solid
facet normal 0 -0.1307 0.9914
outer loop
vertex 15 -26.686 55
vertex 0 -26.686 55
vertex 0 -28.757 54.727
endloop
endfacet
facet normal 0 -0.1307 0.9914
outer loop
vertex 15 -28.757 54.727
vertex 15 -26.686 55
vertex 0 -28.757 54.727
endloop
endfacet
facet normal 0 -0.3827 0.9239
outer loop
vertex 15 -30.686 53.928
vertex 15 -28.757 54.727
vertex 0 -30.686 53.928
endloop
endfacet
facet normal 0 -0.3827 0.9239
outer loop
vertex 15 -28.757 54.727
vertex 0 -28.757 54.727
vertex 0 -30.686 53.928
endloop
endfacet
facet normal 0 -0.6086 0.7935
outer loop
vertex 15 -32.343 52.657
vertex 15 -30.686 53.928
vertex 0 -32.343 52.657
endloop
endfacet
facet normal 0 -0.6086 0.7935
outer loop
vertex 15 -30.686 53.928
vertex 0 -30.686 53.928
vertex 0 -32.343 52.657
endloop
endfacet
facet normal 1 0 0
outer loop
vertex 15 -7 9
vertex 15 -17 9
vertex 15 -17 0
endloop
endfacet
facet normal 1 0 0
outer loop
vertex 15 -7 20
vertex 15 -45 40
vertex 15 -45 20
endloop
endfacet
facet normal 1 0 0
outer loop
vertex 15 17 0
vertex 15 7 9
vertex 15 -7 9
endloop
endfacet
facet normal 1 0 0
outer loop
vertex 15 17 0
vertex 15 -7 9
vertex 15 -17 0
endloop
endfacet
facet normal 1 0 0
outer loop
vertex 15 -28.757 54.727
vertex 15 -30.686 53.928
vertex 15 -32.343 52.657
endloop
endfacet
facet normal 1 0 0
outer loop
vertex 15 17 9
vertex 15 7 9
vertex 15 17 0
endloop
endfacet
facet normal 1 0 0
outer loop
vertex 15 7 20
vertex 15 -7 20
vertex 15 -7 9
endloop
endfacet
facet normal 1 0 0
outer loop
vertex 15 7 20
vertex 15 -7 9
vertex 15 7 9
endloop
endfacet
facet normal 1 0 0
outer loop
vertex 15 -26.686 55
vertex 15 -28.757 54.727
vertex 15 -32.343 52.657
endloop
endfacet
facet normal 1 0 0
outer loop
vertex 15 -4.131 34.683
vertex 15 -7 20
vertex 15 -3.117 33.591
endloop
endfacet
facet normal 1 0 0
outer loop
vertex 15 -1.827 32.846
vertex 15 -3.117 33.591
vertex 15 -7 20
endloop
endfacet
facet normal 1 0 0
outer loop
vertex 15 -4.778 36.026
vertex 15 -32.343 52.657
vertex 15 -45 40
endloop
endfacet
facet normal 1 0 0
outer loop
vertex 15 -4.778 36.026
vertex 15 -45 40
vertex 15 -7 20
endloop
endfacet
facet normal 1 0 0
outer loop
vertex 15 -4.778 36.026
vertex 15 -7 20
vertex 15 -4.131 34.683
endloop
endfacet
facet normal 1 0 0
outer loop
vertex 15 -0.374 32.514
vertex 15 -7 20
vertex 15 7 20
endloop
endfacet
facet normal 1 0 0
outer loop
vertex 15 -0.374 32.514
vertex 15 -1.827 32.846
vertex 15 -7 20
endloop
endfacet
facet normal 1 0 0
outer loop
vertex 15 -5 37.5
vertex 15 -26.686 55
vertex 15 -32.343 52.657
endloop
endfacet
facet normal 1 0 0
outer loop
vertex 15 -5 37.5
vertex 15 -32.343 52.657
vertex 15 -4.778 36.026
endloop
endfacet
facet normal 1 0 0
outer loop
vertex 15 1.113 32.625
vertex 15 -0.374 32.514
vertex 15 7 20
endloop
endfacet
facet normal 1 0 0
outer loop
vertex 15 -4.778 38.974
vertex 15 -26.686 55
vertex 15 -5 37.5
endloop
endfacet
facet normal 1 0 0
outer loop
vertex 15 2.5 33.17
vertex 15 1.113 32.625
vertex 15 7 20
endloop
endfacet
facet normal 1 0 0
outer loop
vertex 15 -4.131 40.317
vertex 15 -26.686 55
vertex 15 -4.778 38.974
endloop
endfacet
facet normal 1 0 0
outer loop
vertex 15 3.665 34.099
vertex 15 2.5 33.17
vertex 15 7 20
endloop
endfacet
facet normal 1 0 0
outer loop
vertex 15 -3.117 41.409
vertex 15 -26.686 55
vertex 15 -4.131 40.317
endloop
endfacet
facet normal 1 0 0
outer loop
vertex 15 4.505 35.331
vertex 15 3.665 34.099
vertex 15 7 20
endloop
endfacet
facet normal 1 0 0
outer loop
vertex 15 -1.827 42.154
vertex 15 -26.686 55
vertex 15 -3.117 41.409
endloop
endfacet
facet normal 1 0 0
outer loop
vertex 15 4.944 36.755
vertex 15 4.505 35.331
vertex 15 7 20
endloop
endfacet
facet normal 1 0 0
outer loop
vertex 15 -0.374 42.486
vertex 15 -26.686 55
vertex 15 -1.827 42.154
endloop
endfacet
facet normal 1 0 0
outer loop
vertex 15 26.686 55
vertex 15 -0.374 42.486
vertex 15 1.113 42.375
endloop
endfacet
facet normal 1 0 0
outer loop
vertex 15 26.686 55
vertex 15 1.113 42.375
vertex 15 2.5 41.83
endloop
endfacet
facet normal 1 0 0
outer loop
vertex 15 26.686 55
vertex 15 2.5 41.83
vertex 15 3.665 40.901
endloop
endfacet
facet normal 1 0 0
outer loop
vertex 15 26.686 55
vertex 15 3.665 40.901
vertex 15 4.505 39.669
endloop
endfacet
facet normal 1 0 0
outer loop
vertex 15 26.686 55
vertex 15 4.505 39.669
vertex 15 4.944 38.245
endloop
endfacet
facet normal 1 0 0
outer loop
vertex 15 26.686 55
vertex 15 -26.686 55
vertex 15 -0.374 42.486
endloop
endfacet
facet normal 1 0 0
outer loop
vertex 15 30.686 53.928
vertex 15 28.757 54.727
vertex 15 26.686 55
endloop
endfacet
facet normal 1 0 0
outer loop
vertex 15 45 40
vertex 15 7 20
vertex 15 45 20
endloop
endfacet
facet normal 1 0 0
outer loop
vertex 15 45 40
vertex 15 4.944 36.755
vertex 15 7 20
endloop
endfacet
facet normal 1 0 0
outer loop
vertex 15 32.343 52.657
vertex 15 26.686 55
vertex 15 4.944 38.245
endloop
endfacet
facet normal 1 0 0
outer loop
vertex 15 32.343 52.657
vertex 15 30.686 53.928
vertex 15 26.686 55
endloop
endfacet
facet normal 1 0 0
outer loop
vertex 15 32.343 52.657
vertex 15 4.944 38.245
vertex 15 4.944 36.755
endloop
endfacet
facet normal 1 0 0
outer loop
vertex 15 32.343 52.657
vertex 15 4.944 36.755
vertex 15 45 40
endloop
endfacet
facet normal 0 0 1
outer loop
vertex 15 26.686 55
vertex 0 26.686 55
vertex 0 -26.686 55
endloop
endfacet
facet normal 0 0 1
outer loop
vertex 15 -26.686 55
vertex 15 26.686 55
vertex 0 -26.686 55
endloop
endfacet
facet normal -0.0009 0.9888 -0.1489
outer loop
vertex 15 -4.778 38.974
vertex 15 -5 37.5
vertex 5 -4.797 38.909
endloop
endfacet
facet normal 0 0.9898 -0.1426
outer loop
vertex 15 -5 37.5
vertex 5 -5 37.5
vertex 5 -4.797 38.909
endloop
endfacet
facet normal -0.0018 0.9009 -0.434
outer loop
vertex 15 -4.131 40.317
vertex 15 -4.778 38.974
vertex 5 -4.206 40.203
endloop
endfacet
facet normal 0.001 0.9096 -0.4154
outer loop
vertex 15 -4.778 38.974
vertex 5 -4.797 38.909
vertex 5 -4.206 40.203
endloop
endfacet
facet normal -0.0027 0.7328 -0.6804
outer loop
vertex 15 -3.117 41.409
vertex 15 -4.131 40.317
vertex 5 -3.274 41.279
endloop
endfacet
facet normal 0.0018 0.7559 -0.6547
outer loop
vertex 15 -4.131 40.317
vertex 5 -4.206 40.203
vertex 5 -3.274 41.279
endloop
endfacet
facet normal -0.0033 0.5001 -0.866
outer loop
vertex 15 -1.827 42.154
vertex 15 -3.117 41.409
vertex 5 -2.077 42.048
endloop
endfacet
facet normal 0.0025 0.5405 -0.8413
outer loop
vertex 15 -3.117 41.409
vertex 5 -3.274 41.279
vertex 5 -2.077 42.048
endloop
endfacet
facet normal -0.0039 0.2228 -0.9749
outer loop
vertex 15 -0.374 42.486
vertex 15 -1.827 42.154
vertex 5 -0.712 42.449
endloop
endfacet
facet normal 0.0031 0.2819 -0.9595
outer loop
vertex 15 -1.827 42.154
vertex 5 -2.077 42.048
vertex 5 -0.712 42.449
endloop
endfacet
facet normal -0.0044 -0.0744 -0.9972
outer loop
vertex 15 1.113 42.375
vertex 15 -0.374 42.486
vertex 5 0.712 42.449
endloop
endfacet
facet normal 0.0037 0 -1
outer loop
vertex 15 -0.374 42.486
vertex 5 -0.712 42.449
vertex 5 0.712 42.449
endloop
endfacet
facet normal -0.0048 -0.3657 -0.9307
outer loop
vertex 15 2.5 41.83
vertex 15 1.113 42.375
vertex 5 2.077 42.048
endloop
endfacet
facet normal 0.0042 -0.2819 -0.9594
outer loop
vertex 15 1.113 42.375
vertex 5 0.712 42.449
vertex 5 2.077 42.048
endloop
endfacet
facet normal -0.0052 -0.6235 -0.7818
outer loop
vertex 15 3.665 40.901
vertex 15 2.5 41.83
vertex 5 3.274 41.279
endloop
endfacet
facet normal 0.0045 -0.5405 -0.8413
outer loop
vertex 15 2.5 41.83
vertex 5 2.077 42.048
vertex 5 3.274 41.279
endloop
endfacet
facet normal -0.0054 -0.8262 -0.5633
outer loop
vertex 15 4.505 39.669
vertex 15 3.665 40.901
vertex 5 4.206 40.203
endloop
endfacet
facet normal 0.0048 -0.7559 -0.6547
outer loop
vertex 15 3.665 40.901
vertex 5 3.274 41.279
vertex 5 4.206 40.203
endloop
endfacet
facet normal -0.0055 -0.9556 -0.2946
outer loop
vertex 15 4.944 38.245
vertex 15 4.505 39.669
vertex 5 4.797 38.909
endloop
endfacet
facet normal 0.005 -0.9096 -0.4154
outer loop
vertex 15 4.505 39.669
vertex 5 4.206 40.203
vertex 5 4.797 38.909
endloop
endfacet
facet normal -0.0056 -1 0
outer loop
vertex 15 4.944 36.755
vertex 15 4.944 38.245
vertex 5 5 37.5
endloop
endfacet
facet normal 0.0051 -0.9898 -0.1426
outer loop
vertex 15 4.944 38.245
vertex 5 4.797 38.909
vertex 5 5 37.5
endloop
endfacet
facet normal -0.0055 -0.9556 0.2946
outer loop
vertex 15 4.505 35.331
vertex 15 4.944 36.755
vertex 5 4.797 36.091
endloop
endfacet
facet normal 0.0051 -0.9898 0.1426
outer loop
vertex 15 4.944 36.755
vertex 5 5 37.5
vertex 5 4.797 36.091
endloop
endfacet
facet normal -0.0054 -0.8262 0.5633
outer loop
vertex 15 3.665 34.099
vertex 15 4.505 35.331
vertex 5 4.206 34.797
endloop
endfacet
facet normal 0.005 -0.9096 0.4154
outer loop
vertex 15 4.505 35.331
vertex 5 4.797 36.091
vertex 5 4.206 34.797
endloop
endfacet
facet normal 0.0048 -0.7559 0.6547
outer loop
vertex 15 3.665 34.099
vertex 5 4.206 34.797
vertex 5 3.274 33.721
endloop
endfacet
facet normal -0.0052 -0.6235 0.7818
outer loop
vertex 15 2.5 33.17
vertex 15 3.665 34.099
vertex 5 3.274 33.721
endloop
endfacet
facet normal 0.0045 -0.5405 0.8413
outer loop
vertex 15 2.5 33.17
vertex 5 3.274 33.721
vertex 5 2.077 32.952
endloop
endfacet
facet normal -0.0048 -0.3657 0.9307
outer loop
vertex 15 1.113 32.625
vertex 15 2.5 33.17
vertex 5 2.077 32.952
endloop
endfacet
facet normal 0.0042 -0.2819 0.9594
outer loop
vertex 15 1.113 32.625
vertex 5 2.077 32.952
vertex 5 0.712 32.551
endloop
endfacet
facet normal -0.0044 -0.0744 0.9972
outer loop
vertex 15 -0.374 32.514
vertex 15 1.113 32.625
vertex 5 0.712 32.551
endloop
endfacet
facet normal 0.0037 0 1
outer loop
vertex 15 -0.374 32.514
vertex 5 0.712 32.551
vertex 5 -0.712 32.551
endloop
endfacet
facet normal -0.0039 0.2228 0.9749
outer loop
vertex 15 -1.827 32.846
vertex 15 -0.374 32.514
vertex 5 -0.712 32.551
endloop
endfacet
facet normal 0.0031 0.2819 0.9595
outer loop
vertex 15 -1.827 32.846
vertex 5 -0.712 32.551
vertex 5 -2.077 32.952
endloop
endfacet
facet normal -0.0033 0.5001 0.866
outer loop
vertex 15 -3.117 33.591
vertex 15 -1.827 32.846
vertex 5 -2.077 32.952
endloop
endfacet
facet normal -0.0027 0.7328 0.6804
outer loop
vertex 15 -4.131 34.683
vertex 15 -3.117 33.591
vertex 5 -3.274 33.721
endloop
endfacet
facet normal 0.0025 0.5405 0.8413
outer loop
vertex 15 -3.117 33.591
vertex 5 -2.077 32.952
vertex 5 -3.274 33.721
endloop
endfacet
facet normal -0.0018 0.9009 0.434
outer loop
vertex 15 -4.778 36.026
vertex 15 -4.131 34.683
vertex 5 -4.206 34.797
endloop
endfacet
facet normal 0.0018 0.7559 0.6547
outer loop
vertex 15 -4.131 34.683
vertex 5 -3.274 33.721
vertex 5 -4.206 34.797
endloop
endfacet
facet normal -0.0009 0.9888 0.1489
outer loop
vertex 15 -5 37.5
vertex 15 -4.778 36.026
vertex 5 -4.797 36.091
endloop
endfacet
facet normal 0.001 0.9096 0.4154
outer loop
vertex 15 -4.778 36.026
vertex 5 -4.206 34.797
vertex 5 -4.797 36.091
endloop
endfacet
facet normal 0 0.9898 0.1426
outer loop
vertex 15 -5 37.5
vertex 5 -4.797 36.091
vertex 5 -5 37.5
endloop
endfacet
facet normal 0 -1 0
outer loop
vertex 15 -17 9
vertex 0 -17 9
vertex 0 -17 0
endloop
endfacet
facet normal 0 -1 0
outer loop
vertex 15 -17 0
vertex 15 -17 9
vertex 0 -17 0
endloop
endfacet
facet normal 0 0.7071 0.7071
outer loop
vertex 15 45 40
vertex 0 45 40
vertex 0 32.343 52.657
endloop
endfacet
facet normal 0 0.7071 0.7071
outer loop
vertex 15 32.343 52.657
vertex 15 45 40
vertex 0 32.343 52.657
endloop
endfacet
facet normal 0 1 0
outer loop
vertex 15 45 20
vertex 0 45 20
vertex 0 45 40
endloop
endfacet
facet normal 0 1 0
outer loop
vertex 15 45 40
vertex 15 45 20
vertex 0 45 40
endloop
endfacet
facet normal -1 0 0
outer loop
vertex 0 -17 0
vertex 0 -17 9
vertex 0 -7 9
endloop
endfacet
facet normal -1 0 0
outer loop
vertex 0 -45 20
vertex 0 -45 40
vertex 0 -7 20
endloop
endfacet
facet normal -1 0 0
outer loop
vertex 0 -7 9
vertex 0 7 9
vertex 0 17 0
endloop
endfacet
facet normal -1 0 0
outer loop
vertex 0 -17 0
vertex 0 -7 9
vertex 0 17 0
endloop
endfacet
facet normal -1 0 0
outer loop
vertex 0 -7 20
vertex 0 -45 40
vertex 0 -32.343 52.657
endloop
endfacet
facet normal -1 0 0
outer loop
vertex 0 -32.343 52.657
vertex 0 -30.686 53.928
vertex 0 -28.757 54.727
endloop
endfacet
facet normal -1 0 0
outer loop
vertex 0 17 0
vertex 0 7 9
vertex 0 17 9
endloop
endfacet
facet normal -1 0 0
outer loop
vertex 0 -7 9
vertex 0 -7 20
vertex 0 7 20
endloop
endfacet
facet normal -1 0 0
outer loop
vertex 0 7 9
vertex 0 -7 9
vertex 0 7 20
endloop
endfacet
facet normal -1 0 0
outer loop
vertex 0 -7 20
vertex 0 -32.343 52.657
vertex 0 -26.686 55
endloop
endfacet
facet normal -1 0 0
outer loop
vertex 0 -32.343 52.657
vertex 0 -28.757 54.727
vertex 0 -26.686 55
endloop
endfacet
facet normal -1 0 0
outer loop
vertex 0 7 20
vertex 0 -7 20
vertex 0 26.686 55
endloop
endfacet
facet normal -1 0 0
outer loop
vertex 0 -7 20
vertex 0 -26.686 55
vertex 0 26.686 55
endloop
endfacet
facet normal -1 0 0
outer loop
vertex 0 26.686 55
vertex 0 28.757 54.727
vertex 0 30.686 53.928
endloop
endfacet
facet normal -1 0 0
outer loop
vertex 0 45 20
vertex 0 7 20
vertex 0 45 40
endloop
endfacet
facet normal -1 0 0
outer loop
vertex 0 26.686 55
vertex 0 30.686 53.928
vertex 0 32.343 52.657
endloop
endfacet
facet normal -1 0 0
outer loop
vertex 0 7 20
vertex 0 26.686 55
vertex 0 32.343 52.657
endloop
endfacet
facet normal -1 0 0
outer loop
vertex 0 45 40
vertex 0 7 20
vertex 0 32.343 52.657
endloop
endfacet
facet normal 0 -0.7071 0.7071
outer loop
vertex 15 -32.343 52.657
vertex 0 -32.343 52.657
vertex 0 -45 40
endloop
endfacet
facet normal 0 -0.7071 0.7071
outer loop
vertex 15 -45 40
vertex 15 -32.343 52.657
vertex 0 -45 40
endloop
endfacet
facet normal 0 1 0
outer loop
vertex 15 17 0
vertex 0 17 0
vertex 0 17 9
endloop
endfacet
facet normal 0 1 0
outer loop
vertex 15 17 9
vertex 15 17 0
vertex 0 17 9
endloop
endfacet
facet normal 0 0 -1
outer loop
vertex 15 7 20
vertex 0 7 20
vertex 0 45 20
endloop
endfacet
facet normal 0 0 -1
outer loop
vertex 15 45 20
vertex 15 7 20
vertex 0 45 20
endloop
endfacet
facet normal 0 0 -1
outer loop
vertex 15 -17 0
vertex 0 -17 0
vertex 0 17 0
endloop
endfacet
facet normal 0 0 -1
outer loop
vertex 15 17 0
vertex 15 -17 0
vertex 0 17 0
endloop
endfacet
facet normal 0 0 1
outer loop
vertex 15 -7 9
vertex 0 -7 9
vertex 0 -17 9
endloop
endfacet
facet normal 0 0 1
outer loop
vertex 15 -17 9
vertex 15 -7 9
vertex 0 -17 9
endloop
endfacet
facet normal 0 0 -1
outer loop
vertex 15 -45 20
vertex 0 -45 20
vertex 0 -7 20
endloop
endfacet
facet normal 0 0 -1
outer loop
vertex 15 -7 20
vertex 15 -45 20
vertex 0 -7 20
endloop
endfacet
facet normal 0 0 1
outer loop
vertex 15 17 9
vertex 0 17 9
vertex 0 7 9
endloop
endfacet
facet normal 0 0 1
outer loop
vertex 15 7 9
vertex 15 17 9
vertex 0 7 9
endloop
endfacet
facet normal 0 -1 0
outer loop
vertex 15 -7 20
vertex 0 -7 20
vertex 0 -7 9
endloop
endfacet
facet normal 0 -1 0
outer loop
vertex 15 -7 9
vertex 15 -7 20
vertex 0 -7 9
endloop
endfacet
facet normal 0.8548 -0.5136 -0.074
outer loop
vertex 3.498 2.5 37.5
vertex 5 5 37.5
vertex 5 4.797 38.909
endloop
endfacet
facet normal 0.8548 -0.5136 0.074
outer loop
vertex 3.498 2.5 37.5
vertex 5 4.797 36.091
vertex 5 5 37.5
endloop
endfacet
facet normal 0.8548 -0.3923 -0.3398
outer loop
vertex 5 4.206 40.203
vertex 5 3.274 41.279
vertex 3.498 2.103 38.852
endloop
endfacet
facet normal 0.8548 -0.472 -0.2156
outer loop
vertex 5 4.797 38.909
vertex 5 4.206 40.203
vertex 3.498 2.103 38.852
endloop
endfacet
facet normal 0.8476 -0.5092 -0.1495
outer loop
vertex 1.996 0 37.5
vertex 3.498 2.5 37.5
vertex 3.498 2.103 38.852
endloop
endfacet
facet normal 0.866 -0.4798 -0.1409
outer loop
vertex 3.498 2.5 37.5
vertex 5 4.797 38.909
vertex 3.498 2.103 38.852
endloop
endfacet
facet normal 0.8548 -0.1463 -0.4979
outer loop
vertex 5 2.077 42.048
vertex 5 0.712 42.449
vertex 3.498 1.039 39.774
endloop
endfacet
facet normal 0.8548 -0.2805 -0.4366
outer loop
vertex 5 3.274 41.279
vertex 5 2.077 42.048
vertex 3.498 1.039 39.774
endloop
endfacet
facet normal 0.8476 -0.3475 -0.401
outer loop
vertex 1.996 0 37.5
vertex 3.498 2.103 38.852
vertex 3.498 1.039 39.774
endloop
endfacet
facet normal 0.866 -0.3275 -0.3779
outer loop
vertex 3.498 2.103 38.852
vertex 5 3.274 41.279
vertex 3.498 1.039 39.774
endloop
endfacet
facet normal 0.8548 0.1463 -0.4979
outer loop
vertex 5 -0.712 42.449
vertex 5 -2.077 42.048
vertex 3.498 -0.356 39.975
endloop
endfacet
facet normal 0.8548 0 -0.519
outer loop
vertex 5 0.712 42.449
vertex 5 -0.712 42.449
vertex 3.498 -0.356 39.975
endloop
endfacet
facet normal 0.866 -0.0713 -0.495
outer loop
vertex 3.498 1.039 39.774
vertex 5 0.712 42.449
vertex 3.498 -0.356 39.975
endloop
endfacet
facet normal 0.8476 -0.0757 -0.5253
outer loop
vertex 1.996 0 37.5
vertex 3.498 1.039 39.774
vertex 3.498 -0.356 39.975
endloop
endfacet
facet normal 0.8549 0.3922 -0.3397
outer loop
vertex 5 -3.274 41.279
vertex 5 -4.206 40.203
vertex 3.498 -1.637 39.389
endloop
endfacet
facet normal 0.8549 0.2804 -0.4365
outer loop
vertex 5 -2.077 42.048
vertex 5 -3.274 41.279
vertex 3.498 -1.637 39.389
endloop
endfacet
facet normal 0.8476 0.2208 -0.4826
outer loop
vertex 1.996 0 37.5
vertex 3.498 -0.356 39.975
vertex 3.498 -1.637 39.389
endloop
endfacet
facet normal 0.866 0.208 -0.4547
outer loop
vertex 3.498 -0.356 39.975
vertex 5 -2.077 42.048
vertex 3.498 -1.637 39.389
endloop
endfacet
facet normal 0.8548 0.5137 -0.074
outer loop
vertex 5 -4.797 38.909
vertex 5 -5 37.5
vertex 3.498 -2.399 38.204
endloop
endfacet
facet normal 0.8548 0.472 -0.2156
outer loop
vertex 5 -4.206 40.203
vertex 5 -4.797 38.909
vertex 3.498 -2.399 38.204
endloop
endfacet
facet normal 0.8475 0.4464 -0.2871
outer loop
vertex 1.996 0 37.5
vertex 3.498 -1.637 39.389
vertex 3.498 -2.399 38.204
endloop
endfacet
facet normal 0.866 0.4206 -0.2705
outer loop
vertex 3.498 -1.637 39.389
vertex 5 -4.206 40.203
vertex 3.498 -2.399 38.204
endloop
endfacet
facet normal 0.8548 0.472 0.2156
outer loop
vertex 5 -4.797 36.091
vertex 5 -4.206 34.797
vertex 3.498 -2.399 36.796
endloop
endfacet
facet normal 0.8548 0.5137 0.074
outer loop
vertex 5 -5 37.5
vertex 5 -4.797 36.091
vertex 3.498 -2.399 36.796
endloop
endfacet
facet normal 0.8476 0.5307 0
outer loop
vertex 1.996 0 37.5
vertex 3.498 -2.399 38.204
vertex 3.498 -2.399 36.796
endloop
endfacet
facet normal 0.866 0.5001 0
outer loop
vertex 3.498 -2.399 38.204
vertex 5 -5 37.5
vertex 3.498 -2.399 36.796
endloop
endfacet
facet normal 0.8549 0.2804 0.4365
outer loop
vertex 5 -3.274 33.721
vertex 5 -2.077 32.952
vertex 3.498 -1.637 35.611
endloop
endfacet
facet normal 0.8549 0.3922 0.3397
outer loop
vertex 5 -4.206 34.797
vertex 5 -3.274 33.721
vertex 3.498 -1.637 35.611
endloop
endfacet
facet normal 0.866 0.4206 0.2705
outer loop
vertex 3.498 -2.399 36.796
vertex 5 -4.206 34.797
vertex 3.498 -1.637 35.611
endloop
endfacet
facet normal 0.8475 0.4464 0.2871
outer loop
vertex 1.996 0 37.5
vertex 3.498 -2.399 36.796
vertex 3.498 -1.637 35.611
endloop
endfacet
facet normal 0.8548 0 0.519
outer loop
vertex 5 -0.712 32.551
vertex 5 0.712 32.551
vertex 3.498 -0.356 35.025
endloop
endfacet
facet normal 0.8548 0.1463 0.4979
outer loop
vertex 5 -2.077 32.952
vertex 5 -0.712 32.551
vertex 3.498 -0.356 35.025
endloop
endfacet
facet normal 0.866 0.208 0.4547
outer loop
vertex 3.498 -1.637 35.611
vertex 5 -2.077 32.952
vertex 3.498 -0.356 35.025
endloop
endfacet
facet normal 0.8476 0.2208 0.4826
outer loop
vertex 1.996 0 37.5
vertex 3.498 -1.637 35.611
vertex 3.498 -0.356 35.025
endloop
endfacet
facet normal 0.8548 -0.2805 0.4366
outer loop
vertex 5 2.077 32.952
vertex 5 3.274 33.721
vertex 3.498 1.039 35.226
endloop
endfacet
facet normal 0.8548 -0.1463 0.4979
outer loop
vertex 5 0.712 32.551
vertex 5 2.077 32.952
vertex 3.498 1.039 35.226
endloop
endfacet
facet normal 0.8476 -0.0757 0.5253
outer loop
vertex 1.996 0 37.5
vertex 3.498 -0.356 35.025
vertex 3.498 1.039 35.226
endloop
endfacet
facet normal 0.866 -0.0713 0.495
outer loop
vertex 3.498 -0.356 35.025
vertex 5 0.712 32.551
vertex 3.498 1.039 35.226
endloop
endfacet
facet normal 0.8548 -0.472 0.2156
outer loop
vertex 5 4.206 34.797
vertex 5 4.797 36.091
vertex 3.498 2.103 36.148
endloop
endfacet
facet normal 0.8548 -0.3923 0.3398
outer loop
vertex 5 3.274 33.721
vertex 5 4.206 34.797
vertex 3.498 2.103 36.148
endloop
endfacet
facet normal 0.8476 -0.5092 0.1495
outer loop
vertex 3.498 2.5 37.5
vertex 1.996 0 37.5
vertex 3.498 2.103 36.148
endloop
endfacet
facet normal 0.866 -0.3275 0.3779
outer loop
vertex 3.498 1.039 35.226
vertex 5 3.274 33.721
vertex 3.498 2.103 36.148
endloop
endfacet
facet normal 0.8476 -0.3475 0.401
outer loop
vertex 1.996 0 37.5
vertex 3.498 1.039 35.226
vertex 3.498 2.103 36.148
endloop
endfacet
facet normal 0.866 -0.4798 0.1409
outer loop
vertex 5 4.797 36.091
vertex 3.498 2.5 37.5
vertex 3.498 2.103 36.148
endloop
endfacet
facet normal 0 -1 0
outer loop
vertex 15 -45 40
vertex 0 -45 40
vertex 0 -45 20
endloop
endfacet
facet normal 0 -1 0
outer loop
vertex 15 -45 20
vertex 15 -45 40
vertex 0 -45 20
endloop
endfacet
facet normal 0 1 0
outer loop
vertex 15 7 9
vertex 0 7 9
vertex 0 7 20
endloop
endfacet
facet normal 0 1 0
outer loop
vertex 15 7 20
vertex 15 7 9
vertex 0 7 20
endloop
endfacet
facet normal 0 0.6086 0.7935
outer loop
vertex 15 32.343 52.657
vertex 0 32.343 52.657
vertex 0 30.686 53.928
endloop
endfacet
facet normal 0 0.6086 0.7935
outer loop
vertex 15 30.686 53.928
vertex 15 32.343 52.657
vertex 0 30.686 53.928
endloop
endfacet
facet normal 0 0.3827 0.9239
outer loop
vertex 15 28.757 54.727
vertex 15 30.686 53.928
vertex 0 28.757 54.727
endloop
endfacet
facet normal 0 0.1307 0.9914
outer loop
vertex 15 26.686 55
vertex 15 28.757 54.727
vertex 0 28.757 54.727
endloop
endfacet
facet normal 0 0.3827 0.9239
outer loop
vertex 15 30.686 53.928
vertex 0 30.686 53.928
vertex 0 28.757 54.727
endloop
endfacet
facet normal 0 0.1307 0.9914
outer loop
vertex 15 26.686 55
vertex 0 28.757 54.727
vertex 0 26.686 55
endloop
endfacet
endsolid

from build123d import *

# Parameters (mm, degrees)
F1_DEPTH = 15
F3_D     = 10
F3_DEPTH = 10
F3_TIP   = 3.0043030951


with BuildPart() as f1:
    # F0 (on Right) → F1 (new body)
    with BuildSketch(Plane.YZ):
        Polygon((-7, 9), (-17, 9), (-17, 0), (17, 0), (17, 9), (7, 9), (7, 20), (-7, 20), align=None)
        with BuildLine():
            Line((-45, 20), (-7, 20))
            Line((-7, 20), (7, 20))
            Line((7, 20), (45, 20))
            Line((45, 20), (45, 40))
            Line((45, 40), (32.3431457505, 52.6568542495))
            ThreePointArc((32.3431457505, 52.6568542495), (29.7477589599, 54.3910362601), (26.686291501, 55))
            Line((26.686291501, 55), (-26.686291501, 55))
            ThreePointArc((-26.686291501, 55), (-29.7477589599, 54.3910362601), (-32.3431457505, 52.6568542495))
            Line((-32.3431457505, 52.6568542495), (-45, 40))
            Line((-45, 40), (-45, 20))
        make_face()
    extrude(amount=F1_DEPTH)

    # F3
    with Locations(Plane.YZ.offset(15)):
        with Locations((0, 37.5)):
            Hole(F3_D / 2, depth=F3_DEPTH)
            with Locations((0, 0, -(F3_DEPTH + F3_TIP / 2))):  # 118° drill point
                Cone(0, F3_D / 2, F3_TIP, mode=Mode.SUBTRACT)


solid = f1.part
